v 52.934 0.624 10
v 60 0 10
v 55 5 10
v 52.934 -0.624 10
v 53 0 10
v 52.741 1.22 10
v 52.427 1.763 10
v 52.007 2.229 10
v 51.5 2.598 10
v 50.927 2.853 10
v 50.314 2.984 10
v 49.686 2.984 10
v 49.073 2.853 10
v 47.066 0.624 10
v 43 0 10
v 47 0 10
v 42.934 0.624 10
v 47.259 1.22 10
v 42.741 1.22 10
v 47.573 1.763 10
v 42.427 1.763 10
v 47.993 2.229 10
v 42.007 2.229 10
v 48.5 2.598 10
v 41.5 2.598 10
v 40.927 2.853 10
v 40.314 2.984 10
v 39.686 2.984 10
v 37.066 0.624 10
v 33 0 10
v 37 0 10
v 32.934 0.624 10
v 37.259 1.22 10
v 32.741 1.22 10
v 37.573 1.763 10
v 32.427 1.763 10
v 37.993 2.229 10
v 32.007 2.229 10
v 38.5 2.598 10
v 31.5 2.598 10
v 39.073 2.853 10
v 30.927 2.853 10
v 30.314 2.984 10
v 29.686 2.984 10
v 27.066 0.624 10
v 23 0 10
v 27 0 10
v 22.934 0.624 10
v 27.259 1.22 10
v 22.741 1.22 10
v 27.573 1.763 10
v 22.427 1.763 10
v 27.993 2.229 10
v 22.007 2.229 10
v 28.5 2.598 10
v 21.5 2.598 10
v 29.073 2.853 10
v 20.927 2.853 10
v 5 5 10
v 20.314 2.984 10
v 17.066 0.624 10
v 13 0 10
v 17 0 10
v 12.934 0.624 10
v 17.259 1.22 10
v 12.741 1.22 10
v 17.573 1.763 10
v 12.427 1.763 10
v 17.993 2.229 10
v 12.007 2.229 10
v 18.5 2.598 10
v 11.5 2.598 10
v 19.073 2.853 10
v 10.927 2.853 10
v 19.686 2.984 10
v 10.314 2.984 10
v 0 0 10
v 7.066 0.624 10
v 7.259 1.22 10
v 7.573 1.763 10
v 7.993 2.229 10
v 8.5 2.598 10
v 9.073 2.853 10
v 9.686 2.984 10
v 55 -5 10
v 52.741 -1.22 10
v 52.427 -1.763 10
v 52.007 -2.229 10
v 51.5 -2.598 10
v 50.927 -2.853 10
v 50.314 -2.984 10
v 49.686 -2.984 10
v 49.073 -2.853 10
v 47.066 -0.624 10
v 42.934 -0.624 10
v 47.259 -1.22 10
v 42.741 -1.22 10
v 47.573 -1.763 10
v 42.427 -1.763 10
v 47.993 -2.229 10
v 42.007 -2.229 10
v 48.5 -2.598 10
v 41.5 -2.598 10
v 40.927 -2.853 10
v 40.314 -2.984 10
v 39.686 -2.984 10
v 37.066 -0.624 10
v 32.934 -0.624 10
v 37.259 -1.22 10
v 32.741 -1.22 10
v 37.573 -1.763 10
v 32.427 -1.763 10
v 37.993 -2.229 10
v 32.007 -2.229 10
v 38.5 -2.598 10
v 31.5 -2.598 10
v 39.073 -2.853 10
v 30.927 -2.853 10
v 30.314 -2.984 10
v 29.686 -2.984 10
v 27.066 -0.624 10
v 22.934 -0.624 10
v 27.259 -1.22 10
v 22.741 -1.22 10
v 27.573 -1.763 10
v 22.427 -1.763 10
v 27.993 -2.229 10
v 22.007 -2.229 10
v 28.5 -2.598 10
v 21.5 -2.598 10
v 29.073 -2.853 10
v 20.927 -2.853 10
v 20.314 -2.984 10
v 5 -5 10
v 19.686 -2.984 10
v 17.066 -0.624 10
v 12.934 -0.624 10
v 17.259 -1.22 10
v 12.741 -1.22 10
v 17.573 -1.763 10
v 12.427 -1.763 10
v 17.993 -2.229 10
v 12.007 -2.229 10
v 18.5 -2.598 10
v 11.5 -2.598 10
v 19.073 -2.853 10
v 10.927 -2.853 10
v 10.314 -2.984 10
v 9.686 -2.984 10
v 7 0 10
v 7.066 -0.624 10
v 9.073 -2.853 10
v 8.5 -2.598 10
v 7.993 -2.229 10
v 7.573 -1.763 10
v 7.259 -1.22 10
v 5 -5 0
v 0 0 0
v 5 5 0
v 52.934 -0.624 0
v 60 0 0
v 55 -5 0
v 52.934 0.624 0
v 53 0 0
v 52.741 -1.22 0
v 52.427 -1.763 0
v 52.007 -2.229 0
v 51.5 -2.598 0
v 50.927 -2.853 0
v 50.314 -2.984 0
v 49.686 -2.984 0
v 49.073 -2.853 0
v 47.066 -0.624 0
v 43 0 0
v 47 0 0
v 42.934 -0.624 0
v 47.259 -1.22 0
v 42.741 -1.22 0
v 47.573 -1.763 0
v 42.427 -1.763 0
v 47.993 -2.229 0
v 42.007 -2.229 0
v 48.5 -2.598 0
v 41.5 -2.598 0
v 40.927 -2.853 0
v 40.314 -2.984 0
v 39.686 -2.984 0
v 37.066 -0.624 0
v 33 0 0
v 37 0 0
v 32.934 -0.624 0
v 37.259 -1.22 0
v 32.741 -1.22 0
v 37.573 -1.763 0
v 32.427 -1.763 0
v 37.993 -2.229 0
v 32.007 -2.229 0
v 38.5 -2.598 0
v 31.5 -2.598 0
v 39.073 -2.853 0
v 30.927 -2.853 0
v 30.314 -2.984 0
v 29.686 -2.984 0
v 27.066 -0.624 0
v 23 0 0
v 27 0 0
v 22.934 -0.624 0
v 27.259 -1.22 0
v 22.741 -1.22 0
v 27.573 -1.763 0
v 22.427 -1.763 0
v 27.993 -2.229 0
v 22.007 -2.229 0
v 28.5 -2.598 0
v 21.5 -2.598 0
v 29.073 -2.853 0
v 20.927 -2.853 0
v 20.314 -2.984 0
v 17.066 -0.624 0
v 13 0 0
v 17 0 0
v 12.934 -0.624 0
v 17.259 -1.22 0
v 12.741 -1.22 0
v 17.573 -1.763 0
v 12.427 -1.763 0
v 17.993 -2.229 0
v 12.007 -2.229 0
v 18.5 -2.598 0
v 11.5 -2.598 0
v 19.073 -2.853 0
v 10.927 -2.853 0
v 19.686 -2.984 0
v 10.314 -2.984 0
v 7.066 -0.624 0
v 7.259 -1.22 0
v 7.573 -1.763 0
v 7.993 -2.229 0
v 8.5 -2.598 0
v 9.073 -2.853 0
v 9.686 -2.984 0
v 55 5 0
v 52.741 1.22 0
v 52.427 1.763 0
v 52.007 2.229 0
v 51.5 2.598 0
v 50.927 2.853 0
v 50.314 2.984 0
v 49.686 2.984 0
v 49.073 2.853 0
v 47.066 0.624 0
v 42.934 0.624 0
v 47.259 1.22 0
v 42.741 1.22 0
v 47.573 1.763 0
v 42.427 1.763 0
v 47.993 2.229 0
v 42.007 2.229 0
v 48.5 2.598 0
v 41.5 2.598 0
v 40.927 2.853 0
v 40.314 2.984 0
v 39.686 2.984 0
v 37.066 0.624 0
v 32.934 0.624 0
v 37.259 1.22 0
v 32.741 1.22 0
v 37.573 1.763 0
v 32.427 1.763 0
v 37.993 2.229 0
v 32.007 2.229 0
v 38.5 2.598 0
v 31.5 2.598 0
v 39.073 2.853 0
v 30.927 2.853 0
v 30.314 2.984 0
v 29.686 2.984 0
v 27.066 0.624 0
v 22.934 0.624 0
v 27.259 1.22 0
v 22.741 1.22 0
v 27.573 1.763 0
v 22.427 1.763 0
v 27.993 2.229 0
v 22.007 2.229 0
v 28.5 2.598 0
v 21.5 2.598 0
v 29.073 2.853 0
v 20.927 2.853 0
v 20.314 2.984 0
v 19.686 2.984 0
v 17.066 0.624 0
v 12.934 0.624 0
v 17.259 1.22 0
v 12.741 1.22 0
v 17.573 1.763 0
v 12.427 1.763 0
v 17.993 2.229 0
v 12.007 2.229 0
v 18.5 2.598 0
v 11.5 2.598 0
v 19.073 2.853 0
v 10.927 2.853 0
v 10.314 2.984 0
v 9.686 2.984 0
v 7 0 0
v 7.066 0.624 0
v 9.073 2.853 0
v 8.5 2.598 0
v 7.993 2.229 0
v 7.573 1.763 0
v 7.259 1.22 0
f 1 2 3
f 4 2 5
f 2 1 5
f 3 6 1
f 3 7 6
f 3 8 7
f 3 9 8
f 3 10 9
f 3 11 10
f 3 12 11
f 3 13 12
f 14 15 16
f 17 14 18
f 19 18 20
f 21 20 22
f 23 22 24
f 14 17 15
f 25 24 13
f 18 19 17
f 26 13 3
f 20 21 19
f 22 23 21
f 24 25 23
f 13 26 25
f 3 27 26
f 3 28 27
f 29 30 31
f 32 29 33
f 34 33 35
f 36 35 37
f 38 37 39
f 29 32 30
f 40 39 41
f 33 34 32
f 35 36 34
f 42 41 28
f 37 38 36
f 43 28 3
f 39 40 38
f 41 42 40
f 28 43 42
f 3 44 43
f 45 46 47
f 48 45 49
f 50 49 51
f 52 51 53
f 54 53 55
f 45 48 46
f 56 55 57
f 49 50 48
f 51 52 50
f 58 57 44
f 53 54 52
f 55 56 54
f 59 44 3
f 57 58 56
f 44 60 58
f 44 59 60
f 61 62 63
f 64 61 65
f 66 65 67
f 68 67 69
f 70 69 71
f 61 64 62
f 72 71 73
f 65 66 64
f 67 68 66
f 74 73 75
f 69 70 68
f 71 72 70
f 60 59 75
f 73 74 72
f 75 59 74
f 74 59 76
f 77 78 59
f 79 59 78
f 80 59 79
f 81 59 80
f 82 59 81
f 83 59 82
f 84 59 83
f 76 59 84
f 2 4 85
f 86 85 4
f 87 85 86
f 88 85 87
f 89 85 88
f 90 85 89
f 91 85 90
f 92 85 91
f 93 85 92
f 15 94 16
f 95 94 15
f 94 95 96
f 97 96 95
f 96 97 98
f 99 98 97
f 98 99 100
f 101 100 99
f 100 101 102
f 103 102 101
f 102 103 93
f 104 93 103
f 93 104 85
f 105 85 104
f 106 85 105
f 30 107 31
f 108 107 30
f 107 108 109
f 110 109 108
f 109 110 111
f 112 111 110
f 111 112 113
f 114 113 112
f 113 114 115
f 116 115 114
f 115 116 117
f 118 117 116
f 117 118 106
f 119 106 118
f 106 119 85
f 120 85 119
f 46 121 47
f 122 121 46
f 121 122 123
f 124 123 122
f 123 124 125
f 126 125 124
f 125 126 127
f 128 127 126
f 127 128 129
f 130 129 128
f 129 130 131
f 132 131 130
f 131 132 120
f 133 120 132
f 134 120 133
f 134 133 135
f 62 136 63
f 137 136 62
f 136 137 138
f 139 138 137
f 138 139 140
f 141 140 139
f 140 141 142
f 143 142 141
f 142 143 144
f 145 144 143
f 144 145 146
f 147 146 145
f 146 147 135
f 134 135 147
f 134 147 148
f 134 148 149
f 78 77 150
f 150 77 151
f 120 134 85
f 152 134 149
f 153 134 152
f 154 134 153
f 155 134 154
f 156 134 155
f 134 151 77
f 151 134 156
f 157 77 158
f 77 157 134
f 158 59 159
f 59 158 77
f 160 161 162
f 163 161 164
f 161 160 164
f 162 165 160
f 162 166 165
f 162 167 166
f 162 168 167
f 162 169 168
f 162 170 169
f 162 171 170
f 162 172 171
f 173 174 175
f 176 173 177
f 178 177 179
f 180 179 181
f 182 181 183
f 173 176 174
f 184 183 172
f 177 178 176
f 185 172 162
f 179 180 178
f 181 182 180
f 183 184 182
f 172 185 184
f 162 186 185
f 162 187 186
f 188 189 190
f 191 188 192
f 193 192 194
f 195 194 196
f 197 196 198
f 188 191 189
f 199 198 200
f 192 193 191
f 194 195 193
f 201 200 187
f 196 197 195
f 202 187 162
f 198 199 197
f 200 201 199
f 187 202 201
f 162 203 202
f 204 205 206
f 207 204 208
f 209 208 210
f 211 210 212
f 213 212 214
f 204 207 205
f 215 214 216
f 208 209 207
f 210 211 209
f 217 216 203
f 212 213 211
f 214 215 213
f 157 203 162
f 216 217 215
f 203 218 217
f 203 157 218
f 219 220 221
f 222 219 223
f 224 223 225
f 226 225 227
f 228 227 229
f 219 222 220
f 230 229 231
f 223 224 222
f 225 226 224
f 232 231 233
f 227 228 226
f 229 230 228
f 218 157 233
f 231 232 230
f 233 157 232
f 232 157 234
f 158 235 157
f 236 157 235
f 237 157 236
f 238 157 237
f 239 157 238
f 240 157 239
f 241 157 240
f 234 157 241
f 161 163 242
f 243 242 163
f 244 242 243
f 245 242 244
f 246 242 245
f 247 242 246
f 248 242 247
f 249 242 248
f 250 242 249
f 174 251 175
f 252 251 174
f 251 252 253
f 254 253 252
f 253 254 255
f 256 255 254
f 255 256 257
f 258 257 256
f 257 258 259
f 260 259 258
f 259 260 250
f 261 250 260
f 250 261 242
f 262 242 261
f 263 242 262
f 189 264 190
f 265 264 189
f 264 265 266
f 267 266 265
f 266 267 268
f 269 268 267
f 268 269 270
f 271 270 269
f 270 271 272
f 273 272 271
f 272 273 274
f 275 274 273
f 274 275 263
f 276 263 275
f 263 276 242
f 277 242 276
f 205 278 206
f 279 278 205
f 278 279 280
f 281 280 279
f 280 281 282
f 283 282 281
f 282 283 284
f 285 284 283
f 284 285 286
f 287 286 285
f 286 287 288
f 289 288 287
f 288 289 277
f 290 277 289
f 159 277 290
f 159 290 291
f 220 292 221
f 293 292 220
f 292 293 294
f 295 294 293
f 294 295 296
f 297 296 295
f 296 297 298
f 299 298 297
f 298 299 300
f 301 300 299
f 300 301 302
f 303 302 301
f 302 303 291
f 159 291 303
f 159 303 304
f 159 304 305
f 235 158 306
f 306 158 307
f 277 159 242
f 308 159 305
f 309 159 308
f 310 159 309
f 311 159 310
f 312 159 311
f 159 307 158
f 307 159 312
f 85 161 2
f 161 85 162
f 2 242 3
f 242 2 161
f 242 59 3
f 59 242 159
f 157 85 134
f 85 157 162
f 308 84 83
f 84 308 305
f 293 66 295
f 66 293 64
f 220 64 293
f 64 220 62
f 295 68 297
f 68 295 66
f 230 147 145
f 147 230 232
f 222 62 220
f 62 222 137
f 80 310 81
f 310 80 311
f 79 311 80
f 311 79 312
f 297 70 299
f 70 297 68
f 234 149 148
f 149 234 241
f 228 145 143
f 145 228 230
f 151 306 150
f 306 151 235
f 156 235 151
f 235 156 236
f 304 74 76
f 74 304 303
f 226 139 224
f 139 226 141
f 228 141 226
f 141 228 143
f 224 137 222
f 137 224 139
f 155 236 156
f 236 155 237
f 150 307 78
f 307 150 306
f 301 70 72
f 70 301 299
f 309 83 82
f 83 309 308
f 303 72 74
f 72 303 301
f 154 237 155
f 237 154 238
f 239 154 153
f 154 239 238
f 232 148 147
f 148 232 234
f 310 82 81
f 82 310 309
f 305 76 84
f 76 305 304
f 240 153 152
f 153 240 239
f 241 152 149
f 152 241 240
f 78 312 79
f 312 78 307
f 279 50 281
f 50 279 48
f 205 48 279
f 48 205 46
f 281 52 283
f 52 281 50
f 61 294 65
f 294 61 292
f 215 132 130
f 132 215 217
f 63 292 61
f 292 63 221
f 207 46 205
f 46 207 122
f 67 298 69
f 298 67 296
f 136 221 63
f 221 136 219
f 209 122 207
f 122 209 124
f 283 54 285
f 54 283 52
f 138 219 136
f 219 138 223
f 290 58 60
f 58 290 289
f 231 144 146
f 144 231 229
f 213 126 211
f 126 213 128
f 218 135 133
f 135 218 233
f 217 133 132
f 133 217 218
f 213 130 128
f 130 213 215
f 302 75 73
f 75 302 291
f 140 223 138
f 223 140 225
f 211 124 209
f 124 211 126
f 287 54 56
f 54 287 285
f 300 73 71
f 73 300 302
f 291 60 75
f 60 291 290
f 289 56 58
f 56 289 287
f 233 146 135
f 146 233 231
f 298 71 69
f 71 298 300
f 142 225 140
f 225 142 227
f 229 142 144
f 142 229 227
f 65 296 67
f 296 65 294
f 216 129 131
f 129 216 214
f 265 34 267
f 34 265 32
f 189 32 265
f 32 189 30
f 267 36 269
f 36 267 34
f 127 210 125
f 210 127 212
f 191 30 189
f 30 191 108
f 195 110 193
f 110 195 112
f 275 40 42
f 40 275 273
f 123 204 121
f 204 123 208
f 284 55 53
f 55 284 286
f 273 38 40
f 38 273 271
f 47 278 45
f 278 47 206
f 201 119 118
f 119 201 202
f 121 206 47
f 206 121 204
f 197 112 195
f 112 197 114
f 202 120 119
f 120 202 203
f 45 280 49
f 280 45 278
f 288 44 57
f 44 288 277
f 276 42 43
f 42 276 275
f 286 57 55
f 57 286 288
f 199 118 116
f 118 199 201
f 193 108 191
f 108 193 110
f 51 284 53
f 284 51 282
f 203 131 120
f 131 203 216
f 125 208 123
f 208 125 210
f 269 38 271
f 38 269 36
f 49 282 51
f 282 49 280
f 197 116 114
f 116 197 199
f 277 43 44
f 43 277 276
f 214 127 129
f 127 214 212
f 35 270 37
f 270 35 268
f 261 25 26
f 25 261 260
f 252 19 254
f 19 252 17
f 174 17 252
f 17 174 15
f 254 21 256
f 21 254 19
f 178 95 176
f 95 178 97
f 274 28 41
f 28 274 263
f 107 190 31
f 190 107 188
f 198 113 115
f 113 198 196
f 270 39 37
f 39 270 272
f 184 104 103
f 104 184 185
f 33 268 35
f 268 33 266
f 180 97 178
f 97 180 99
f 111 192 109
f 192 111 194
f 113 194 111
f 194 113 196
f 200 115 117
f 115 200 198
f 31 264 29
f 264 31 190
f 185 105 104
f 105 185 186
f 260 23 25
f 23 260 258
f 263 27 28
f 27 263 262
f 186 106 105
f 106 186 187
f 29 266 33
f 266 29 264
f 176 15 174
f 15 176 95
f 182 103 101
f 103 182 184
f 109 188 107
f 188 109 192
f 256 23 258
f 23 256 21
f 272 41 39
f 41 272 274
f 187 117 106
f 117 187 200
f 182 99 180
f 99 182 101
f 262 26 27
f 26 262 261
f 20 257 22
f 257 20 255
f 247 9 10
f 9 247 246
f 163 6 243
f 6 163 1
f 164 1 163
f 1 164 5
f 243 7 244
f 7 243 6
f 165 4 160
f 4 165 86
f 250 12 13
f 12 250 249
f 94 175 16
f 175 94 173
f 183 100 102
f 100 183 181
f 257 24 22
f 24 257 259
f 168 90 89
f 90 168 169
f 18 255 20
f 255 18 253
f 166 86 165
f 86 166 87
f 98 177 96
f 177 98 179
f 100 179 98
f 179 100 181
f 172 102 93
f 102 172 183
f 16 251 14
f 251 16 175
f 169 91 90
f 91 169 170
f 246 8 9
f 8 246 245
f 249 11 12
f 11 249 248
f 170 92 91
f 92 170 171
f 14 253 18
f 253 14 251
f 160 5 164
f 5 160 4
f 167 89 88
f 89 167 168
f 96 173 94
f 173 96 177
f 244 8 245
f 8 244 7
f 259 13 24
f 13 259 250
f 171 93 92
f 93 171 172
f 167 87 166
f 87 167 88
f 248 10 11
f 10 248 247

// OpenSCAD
num_holes = 5;
hole_radius = 3;
width = 10;
height = 10;
length = 60;

side_length = length / sqrt(2);
module holesStick() {
	difference() {
		intersection() {
			translate([1 / sqrt(2) * side_length, 1 / sqrt(2) * -side_length, 0]) {
				rotate([0, 0, 45]) { //Create the pointy edges.
					cube([side_length, side_length, height]);
				}
			}
			translate([0, -width / 2, 0]) { //Create the long shape.
				cube([sqrt(2) * side_length, width, height]);
			}
		}
		for(x = [width:(sqrt(2) * side_length - 20) / (num_holes - 1):length - width]) {
			translate([x, 0, 0]) {
				cylinder(r = hole_radius, h = height, $fn = 30); //The holes.
			}
		}
	}
}

holesStick();
//translate([length, 0, 0]) {
//	holesStick();
//}
